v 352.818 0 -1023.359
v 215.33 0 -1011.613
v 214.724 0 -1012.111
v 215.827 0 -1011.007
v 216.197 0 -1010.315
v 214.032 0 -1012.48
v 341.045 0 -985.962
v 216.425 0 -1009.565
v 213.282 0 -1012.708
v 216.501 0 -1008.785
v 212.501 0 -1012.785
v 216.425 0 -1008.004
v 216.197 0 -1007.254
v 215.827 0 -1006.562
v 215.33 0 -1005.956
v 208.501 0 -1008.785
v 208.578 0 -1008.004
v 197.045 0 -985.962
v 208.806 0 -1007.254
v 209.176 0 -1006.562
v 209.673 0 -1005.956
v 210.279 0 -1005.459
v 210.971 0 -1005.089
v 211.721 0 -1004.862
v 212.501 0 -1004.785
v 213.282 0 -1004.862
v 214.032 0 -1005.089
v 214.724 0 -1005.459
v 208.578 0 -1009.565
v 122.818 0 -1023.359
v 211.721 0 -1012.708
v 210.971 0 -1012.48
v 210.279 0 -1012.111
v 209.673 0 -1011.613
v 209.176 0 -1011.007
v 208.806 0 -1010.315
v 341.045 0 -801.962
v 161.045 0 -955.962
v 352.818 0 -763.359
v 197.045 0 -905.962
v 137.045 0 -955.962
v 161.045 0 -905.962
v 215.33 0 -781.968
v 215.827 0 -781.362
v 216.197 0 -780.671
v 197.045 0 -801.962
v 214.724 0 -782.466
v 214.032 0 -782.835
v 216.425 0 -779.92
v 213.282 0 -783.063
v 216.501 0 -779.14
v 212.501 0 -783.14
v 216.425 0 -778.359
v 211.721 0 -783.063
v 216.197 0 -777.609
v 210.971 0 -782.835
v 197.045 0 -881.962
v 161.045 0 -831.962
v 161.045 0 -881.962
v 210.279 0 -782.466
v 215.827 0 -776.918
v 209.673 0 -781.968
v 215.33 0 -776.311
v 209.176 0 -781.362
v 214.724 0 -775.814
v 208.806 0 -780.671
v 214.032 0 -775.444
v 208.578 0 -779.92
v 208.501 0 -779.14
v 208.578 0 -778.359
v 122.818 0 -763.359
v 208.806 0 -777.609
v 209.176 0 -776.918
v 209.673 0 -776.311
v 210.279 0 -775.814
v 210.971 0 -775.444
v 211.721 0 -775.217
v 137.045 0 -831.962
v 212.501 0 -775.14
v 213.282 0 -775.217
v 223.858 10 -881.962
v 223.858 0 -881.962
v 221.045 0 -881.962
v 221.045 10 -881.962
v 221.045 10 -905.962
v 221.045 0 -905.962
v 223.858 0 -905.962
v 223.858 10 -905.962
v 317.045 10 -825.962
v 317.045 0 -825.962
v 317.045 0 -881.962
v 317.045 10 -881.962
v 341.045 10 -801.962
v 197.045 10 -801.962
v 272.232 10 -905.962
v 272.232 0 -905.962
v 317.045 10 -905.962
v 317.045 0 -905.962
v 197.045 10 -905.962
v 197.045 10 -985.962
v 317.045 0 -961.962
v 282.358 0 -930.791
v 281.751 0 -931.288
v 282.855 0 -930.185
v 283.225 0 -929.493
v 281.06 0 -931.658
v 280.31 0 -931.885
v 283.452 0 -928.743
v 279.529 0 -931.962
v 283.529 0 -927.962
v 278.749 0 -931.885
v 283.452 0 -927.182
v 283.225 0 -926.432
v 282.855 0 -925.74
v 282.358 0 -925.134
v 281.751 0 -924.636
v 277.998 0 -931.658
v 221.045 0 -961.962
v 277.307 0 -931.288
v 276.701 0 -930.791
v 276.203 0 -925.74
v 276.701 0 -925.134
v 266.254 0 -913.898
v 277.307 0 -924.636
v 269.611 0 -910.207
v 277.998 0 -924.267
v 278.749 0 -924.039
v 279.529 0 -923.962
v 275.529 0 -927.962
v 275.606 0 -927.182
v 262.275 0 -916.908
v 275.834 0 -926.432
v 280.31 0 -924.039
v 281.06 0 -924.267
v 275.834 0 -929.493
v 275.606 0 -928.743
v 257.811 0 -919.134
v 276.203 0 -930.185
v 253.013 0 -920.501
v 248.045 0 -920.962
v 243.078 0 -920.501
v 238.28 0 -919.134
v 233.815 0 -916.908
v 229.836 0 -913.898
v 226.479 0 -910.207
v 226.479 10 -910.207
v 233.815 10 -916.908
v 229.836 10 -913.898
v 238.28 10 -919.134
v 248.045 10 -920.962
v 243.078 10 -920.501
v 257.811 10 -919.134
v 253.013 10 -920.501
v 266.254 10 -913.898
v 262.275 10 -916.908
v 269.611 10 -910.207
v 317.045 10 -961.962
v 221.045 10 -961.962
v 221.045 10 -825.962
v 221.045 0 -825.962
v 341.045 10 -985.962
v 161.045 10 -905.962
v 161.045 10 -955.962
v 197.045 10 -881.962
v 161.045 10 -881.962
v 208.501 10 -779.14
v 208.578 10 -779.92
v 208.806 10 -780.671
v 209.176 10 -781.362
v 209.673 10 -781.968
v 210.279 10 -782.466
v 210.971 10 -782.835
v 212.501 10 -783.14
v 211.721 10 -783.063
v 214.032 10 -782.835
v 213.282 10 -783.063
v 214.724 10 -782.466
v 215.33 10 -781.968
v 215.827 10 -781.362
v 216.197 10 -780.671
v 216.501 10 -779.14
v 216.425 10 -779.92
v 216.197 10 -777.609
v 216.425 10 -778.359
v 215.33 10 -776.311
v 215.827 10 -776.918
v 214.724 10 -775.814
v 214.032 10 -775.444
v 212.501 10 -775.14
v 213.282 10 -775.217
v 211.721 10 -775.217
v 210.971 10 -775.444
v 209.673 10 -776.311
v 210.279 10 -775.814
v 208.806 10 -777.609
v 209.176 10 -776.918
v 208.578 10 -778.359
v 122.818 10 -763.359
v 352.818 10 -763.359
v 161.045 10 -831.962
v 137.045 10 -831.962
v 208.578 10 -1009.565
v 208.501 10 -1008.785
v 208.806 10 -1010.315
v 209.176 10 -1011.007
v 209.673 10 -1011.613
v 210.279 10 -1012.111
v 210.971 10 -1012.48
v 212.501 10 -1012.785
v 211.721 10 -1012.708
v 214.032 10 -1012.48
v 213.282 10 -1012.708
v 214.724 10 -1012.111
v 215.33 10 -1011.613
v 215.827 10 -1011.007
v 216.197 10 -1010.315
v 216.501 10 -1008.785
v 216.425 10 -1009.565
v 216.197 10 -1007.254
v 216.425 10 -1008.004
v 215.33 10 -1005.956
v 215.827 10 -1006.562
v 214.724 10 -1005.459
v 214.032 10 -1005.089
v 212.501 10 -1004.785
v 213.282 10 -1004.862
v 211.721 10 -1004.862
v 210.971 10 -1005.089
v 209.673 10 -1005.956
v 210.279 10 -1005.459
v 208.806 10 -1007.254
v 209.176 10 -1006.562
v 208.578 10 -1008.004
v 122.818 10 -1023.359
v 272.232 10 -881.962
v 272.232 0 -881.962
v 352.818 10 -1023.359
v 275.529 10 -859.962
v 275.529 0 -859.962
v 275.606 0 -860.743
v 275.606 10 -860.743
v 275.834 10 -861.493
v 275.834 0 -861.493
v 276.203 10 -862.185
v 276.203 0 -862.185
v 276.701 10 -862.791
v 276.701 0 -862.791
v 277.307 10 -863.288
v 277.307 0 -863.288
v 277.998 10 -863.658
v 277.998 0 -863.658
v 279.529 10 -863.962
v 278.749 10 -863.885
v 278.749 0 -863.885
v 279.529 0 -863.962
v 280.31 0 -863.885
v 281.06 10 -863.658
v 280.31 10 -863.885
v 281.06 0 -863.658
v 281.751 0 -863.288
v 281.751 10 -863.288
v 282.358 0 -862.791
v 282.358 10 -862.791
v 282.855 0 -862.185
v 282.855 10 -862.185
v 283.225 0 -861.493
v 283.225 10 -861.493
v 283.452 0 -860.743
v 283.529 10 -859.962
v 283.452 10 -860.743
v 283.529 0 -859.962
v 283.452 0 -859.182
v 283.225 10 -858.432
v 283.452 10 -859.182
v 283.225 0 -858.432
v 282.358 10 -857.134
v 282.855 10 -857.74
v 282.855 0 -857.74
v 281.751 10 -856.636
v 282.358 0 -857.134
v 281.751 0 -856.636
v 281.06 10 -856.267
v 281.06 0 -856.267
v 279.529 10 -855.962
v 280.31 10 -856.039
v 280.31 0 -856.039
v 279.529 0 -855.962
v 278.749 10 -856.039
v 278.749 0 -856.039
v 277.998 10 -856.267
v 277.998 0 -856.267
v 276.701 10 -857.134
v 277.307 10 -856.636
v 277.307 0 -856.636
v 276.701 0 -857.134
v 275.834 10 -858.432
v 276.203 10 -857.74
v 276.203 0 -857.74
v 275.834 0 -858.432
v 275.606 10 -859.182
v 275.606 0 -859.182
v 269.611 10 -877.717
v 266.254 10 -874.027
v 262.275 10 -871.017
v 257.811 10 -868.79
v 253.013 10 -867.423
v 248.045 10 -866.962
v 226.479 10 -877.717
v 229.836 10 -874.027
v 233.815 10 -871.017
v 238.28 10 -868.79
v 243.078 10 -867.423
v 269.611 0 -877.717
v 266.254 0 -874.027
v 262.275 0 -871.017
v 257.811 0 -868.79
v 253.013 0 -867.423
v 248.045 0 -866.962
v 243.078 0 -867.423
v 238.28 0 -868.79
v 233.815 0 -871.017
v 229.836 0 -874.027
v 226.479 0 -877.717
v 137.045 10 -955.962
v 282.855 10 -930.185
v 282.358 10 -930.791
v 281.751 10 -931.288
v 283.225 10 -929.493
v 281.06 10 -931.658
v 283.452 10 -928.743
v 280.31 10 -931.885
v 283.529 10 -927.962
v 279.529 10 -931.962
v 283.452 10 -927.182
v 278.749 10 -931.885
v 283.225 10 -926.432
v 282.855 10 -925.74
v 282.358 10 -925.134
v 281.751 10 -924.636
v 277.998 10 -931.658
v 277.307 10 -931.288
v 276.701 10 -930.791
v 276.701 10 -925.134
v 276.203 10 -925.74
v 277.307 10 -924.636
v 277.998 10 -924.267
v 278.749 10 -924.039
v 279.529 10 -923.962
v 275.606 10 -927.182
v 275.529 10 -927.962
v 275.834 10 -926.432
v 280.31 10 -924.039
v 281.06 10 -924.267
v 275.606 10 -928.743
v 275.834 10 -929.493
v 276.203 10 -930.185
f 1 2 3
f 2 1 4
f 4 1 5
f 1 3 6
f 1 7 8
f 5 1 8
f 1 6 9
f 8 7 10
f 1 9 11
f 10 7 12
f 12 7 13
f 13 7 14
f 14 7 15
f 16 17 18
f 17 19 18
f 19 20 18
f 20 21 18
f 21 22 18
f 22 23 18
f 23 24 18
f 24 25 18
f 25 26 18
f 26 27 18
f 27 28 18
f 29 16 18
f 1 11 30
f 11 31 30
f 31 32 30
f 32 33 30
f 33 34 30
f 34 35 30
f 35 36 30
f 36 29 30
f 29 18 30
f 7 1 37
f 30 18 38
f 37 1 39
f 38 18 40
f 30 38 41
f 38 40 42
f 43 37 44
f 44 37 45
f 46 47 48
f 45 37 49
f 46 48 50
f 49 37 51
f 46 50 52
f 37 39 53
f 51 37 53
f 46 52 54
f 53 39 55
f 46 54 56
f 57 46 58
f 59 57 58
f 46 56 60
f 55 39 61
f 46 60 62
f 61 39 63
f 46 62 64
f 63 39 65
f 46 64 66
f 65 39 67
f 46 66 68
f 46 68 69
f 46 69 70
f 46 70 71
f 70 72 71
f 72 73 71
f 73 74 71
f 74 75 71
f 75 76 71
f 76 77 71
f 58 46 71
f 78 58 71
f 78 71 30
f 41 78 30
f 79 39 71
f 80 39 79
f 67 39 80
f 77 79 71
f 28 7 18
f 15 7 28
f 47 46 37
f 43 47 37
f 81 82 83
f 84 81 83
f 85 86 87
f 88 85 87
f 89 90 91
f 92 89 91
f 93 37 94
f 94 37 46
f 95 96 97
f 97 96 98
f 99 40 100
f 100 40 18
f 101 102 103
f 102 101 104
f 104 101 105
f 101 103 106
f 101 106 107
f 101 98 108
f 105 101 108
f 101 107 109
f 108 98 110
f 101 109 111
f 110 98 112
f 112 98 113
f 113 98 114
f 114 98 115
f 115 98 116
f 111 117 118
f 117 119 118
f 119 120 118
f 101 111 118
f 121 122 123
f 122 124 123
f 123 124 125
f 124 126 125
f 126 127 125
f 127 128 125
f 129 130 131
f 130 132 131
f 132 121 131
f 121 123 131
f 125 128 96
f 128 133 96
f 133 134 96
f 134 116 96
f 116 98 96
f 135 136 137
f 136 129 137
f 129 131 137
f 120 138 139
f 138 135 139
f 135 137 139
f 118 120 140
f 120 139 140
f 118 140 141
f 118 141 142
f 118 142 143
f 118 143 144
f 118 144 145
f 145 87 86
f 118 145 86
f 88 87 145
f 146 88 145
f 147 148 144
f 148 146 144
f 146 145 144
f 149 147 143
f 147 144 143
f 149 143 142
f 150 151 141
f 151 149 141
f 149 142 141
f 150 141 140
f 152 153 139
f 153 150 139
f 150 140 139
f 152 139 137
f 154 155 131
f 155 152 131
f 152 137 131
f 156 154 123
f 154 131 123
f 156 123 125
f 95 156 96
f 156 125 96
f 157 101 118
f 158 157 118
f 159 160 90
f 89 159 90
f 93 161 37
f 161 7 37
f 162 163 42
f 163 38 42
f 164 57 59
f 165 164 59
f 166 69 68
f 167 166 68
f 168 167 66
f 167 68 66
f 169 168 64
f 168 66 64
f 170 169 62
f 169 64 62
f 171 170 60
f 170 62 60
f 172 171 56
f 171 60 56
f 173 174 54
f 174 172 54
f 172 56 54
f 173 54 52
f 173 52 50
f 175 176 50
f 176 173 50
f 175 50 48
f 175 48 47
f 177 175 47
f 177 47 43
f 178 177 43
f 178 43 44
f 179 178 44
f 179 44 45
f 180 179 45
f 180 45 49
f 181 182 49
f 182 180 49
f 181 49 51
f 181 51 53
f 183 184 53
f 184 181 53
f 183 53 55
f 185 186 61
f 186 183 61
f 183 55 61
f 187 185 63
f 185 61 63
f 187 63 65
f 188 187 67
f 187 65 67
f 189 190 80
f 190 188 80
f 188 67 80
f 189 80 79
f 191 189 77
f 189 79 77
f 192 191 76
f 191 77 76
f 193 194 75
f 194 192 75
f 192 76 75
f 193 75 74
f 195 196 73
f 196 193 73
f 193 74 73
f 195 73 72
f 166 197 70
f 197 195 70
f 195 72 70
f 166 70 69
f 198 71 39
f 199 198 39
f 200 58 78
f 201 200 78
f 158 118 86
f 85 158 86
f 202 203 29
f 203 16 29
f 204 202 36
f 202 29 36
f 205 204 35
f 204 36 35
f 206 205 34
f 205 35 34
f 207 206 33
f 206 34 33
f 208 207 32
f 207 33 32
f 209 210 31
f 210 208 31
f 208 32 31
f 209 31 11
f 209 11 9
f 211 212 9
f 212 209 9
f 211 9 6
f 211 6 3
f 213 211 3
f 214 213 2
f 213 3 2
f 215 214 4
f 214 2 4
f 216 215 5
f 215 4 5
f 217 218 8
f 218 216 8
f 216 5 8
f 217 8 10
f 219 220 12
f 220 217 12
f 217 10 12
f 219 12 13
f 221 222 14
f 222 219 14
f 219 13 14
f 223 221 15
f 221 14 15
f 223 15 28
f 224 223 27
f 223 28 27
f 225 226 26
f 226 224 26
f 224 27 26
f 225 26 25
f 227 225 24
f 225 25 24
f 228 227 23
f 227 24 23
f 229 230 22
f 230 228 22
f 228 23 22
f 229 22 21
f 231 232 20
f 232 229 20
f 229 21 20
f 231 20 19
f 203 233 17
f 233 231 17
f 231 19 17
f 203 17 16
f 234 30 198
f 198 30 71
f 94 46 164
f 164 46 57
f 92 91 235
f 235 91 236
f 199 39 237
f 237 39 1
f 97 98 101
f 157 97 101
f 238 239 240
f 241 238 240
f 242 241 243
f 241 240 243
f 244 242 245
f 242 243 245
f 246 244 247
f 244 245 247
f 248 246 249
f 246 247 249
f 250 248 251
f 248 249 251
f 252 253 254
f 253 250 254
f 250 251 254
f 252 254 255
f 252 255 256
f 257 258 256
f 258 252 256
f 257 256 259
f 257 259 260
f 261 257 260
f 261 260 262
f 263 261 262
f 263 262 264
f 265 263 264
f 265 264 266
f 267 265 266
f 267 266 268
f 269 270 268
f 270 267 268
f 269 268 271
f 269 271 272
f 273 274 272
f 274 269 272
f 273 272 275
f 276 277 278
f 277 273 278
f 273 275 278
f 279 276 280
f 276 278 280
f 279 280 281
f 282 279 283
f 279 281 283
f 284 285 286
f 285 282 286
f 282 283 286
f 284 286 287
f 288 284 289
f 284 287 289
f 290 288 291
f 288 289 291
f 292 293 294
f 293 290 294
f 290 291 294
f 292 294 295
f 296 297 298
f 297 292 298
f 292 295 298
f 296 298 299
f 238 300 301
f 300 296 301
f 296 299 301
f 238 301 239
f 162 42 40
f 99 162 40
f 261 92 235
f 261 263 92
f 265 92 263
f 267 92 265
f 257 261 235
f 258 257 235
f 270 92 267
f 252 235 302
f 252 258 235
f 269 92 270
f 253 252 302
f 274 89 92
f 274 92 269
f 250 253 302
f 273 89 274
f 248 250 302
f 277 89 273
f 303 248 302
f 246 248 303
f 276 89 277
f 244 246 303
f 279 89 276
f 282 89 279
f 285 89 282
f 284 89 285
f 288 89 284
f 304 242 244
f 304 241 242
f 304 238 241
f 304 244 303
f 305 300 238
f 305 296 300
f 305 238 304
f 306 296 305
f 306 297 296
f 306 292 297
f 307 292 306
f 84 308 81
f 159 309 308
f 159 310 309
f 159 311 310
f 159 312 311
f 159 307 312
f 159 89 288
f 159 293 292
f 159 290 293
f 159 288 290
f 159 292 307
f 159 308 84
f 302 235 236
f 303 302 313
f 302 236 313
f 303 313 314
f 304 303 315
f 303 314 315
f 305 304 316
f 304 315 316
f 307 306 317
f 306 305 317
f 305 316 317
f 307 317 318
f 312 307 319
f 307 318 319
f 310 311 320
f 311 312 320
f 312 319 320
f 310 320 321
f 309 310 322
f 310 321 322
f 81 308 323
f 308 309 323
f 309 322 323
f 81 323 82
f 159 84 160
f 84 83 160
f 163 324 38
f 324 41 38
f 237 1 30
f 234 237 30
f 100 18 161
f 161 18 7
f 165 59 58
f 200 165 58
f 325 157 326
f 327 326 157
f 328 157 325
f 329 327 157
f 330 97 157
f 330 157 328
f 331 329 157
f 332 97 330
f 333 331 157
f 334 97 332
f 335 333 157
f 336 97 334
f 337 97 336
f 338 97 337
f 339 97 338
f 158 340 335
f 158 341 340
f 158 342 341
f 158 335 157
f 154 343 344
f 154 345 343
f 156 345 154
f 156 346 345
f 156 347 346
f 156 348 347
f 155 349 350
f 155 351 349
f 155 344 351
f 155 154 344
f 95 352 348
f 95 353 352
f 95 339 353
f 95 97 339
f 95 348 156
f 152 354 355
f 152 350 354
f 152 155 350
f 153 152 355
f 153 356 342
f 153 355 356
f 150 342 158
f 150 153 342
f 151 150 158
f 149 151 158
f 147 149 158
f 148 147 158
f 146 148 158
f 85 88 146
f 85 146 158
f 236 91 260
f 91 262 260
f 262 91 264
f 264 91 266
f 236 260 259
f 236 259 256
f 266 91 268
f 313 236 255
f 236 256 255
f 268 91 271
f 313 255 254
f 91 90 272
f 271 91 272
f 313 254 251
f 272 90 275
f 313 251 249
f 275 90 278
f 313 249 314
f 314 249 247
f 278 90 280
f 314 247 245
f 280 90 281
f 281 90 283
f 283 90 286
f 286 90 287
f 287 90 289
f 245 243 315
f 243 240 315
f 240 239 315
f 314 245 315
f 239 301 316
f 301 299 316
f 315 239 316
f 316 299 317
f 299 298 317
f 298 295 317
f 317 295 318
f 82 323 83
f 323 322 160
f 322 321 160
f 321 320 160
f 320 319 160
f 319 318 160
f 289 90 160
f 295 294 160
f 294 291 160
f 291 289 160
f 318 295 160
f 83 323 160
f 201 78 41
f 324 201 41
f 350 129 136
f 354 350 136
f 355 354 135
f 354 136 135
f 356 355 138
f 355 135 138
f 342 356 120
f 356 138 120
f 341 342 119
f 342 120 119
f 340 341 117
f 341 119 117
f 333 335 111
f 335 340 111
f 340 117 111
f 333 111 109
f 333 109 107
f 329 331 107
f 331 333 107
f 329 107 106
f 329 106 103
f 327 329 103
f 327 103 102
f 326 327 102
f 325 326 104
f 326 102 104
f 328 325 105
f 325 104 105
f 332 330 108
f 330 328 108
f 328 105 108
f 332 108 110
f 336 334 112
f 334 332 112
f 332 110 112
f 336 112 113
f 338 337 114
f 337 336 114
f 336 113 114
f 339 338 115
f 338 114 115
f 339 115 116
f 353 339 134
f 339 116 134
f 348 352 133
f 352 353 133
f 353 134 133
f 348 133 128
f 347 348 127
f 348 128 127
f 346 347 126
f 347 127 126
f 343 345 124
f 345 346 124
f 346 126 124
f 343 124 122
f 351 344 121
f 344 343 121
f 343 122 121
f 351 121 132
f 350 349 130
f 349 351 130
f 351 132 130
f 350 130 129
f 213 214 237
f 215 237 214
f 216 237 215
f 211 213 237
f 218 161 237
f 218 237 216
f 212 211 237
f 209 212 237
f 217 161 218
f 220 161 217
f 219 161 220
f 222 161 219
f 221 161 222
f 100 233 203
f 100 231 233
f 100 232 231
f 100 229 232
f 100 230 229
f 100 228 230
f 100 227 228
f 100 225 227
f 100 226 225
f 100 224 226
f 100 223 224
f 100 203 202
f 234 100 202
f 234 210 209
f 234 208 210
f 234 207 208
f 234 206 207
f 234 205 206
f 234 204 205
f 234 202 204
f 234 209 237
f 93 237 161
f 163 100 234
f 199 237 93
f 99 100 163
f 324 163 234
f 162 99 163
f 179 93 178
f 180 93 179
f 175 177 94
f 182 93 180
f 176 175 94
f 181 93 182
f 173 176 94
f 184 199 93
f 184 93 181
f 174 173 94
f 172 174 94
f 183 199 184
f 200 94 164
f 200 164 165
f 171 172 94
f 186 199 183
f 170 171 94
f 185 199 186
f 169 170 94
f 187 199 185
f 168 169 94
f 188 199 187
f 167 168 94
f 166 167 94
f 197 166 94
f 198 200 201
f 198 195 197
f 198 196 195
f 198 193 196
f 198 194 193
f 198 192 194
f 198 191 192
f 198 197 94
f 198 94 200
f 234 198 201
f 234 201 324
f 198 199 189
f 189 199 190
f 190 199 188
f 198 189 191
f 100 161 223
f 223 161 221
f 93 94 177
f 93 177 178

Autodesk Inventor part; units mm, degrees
ref_plane "YZ Plane" through (0, 0, 0) normal (1, 0, 0) x (0, 1, 0)
ref_plane "XZ Plane" through (0, 0, 0) normal (0, 1, 0) x (-1, 0, 0)
ref_plane "XY Plane" through (0, 0, 0) normal (0, 0, 1) x (1, 0, 0)
sketch "Boceto1" plane through (0, 0, 0) normal (0, 1, 0) x (-1, 0, 0)
  line L0 (-352.8177, -763.3588) -> (-352.8177, -1023.3588) projected
  line L1 (-352.8177, -1023.3588) -> (-122.8177, -1023.3588) projected
  line L2 (-122.8177, -1023.3588) -> (-122.8177, -763.3588) projected
  line L3 (-122.8177, -763.3588) -> (-352.8177, -763.3588) projected
  circle A0 centre (-329.0452, -813.9623) radius 4 projected
  circle A1 centre (-329.0452, -973.9623) radius 4 projected
  circle A2 centre (-279.5292, -859.9623) radius 4 projected
  circle A3 centre (-212.5014, -779.1398) radius 4 projected
  circle A4 centre (-149.0452, -842.9623) radius 4 projected
  circle A5 centre (-149.0452, -944.9623) radius 4 projected
  circle A6 centre (-212.5014, -1008.7847) radius 4 projected
  circle A7 centre (-279.5292, -927.9623) radius 4 projected
  line L4 (-122.8177, -763.3588) -> (-352.8177, -763.3588)
  line L5 (-352.8177, -763.3588) -> (-352.8177, -1023.3588)
  line L6 (-352.8177, -1023.3588) -> (-122.8177, -1023.3588)
  line L7 (-122.8177, -1023.3588) -> (-122.8177, -763.3588)
  circle A8 centre (-329.0452, -973.9623) radius 4 projected
  circle A9 centre (-329.0452, -813.9623) radius 4 projected
  line L8 (-159.0452, -953.9623) -> (-139.0452, -953.9623) projected
  line L9 (-139.0452, -953.9623) -> (-139.0452, -833.9623) projected
  line L10 (-139.0452, -833.9623) -> (-159.0452, -833.9623) projected
  line L11 (-159.0452, -833.9623) -> (-159.0452, -883.9623) projected
  line L12 (-159.0452, -883.9623) -> (-199.0452, -883.9623) projected
  line L13 (-199.0452, -883.9623) -> (-199.0452, -803.9623) projected
  line L14 (-199.0452, -803.9623) -> (-339.0452, -803.9623) projected
  line L15 (-339.0452, -803.9623) -> (-339.0452, -983.9623) projected
  line L16 (-339.0452, -983.9623) -> (-199.0452, -983.9623) projected
  line L17 (-199.0452, -983.9623) -> (-199.0452, -903.9623) projected
  line L18 (-199.0452, -903.9623) -> (-159.0452, -903.9623) projected
  line L19 (-159.0452, -903.9623) -> (-159.0452, -953.9623) projected
  circle A10 centre (-149.0452, -944.9623) radius 4 projected
  circle A11 centre (-149.0452, -842.9623) radius 4 projected
  line L20 (-219.0452, -903.9623) -> (-219.0452, -963.9623) projected
  line L21 (-219.0452, -963.9623) -> (-319.0452, -963.9623) projected
  line L22 (-319.0452, -963.9623) -> (-319.0452, -903.9623) projected
  line L23 (-319.0452, -903.9623) -> (-270.958, -903.9623) projected
  arc A12 (-270.958, -903.9623) -> (-225.1323, -903.9623) centre (-248.0452, -893.9623) ccw projected
  line L24 (-225.1323, -903.9623) -> (-219.0452, -903.9623) projected
  line L25 (-219.0452, -883.9623) -> (-225.1323, -883.9623) projected
  arc A13 (-225.1323, -883.9623) -> (-270.958, -883.9623) centre (-248.0452, -893.9623) ccw projected
  line L26 (-270.958, -883.9623) -> (-319.0452, -883.9623) projected
  line L27 (-319.0452, -883.9623) -> (-319.0452, -823.9623) projected
  line L28 (-319.0452, -823.9623) -> (-219.0452, -823.9623) projected
  line L29 (-219.0452, -823.9623) -> (-219.0452, -883.9623) projected
  line L30 (-197.0452, -801.9623) -> (-197.0452, -881.9623)
  line L31 (-197.0452, -881.9623) -> (-161.0452, -881.9623)
  line L32 (-161.0452, -881.9623) -> (-161.0452, -831.9623)
  line L33 (-161.0452, -831.9623) -> (-137.0452, -831.9623)
  line L34 (-137.0452, -831.9623) -> (-137.0452, -955.9623)
  line L35 (-137.0452, -955.9623) -> (-161.0452, -955.9623)
  line L36 (-161.0452, -955.9623) -> (-161.0452, -905.9623)
  line L37 (-161.0452, -905.9623) -> (-197.0452, -905.9623)
  line L38 (-197.0452, -905.9623) -> (-197.0452, -985.9623)
  line L39 (-197.0452, -985.9623) -> (-341.0452, -985.9623)
  line L40 (-341.0452, -985.9623) -> (-341.0452, -801.9623)
  line L41 (-341.0452, -801.9623) -> (-197.0452, -801.9623)
  arc A14 (-272.2319, -905.9623) -> (-223.8584, -905.9623) centre (-248.0452, -893.9623) ccw
  line L42 (-272.2319, -905.9623) -> (-317.0452, -905.9623)
  line L43 (-317.0452, -905.9623) -> (-317.0452, -961.9623)
  line L44 (-317.0452, -961.9623) -> (-221.0452, -961.9623)
  line L45 (-221.0452, -961.9623) -> (-221.0452, -905.9623)
  line L46 (-221.0452, -905.9623) -> (-223.8584, -905.9623)
  arc A15 (-223.8584, -881.9623) -> (-272.2319, -881.9623) centre (-248.0452, -893.9623) ccw
  line L47 (-223.8584, -881.9623) -> (-221.0452, -881.9623)
  line L48 (-221.0452, -881.9623) -> (-221.0452, -825.9623)
  line L49 (-221.0452, -825.9623) -> (-317.0452, -825.9623)
  line L50 (-317.0452, -825.9623) -> (-317.0452, -881.9623)
  line L51 (-317.0452, -881.9623) -> (-272.2319, -881.9623)
  point P0 (0, 0)
  dimension "d0" = 2
  dimension "d1" = 2
  dimension "d2" = 2
extrude "Extrusión1" add sketch "Boceto1" along normal blind 10 contours L3 L2 L1 L0 | A14 L46 L45 L44 L43 L42 | A15 L51 L50 L49 L48 L47
properties part number "Etapa2Base"
